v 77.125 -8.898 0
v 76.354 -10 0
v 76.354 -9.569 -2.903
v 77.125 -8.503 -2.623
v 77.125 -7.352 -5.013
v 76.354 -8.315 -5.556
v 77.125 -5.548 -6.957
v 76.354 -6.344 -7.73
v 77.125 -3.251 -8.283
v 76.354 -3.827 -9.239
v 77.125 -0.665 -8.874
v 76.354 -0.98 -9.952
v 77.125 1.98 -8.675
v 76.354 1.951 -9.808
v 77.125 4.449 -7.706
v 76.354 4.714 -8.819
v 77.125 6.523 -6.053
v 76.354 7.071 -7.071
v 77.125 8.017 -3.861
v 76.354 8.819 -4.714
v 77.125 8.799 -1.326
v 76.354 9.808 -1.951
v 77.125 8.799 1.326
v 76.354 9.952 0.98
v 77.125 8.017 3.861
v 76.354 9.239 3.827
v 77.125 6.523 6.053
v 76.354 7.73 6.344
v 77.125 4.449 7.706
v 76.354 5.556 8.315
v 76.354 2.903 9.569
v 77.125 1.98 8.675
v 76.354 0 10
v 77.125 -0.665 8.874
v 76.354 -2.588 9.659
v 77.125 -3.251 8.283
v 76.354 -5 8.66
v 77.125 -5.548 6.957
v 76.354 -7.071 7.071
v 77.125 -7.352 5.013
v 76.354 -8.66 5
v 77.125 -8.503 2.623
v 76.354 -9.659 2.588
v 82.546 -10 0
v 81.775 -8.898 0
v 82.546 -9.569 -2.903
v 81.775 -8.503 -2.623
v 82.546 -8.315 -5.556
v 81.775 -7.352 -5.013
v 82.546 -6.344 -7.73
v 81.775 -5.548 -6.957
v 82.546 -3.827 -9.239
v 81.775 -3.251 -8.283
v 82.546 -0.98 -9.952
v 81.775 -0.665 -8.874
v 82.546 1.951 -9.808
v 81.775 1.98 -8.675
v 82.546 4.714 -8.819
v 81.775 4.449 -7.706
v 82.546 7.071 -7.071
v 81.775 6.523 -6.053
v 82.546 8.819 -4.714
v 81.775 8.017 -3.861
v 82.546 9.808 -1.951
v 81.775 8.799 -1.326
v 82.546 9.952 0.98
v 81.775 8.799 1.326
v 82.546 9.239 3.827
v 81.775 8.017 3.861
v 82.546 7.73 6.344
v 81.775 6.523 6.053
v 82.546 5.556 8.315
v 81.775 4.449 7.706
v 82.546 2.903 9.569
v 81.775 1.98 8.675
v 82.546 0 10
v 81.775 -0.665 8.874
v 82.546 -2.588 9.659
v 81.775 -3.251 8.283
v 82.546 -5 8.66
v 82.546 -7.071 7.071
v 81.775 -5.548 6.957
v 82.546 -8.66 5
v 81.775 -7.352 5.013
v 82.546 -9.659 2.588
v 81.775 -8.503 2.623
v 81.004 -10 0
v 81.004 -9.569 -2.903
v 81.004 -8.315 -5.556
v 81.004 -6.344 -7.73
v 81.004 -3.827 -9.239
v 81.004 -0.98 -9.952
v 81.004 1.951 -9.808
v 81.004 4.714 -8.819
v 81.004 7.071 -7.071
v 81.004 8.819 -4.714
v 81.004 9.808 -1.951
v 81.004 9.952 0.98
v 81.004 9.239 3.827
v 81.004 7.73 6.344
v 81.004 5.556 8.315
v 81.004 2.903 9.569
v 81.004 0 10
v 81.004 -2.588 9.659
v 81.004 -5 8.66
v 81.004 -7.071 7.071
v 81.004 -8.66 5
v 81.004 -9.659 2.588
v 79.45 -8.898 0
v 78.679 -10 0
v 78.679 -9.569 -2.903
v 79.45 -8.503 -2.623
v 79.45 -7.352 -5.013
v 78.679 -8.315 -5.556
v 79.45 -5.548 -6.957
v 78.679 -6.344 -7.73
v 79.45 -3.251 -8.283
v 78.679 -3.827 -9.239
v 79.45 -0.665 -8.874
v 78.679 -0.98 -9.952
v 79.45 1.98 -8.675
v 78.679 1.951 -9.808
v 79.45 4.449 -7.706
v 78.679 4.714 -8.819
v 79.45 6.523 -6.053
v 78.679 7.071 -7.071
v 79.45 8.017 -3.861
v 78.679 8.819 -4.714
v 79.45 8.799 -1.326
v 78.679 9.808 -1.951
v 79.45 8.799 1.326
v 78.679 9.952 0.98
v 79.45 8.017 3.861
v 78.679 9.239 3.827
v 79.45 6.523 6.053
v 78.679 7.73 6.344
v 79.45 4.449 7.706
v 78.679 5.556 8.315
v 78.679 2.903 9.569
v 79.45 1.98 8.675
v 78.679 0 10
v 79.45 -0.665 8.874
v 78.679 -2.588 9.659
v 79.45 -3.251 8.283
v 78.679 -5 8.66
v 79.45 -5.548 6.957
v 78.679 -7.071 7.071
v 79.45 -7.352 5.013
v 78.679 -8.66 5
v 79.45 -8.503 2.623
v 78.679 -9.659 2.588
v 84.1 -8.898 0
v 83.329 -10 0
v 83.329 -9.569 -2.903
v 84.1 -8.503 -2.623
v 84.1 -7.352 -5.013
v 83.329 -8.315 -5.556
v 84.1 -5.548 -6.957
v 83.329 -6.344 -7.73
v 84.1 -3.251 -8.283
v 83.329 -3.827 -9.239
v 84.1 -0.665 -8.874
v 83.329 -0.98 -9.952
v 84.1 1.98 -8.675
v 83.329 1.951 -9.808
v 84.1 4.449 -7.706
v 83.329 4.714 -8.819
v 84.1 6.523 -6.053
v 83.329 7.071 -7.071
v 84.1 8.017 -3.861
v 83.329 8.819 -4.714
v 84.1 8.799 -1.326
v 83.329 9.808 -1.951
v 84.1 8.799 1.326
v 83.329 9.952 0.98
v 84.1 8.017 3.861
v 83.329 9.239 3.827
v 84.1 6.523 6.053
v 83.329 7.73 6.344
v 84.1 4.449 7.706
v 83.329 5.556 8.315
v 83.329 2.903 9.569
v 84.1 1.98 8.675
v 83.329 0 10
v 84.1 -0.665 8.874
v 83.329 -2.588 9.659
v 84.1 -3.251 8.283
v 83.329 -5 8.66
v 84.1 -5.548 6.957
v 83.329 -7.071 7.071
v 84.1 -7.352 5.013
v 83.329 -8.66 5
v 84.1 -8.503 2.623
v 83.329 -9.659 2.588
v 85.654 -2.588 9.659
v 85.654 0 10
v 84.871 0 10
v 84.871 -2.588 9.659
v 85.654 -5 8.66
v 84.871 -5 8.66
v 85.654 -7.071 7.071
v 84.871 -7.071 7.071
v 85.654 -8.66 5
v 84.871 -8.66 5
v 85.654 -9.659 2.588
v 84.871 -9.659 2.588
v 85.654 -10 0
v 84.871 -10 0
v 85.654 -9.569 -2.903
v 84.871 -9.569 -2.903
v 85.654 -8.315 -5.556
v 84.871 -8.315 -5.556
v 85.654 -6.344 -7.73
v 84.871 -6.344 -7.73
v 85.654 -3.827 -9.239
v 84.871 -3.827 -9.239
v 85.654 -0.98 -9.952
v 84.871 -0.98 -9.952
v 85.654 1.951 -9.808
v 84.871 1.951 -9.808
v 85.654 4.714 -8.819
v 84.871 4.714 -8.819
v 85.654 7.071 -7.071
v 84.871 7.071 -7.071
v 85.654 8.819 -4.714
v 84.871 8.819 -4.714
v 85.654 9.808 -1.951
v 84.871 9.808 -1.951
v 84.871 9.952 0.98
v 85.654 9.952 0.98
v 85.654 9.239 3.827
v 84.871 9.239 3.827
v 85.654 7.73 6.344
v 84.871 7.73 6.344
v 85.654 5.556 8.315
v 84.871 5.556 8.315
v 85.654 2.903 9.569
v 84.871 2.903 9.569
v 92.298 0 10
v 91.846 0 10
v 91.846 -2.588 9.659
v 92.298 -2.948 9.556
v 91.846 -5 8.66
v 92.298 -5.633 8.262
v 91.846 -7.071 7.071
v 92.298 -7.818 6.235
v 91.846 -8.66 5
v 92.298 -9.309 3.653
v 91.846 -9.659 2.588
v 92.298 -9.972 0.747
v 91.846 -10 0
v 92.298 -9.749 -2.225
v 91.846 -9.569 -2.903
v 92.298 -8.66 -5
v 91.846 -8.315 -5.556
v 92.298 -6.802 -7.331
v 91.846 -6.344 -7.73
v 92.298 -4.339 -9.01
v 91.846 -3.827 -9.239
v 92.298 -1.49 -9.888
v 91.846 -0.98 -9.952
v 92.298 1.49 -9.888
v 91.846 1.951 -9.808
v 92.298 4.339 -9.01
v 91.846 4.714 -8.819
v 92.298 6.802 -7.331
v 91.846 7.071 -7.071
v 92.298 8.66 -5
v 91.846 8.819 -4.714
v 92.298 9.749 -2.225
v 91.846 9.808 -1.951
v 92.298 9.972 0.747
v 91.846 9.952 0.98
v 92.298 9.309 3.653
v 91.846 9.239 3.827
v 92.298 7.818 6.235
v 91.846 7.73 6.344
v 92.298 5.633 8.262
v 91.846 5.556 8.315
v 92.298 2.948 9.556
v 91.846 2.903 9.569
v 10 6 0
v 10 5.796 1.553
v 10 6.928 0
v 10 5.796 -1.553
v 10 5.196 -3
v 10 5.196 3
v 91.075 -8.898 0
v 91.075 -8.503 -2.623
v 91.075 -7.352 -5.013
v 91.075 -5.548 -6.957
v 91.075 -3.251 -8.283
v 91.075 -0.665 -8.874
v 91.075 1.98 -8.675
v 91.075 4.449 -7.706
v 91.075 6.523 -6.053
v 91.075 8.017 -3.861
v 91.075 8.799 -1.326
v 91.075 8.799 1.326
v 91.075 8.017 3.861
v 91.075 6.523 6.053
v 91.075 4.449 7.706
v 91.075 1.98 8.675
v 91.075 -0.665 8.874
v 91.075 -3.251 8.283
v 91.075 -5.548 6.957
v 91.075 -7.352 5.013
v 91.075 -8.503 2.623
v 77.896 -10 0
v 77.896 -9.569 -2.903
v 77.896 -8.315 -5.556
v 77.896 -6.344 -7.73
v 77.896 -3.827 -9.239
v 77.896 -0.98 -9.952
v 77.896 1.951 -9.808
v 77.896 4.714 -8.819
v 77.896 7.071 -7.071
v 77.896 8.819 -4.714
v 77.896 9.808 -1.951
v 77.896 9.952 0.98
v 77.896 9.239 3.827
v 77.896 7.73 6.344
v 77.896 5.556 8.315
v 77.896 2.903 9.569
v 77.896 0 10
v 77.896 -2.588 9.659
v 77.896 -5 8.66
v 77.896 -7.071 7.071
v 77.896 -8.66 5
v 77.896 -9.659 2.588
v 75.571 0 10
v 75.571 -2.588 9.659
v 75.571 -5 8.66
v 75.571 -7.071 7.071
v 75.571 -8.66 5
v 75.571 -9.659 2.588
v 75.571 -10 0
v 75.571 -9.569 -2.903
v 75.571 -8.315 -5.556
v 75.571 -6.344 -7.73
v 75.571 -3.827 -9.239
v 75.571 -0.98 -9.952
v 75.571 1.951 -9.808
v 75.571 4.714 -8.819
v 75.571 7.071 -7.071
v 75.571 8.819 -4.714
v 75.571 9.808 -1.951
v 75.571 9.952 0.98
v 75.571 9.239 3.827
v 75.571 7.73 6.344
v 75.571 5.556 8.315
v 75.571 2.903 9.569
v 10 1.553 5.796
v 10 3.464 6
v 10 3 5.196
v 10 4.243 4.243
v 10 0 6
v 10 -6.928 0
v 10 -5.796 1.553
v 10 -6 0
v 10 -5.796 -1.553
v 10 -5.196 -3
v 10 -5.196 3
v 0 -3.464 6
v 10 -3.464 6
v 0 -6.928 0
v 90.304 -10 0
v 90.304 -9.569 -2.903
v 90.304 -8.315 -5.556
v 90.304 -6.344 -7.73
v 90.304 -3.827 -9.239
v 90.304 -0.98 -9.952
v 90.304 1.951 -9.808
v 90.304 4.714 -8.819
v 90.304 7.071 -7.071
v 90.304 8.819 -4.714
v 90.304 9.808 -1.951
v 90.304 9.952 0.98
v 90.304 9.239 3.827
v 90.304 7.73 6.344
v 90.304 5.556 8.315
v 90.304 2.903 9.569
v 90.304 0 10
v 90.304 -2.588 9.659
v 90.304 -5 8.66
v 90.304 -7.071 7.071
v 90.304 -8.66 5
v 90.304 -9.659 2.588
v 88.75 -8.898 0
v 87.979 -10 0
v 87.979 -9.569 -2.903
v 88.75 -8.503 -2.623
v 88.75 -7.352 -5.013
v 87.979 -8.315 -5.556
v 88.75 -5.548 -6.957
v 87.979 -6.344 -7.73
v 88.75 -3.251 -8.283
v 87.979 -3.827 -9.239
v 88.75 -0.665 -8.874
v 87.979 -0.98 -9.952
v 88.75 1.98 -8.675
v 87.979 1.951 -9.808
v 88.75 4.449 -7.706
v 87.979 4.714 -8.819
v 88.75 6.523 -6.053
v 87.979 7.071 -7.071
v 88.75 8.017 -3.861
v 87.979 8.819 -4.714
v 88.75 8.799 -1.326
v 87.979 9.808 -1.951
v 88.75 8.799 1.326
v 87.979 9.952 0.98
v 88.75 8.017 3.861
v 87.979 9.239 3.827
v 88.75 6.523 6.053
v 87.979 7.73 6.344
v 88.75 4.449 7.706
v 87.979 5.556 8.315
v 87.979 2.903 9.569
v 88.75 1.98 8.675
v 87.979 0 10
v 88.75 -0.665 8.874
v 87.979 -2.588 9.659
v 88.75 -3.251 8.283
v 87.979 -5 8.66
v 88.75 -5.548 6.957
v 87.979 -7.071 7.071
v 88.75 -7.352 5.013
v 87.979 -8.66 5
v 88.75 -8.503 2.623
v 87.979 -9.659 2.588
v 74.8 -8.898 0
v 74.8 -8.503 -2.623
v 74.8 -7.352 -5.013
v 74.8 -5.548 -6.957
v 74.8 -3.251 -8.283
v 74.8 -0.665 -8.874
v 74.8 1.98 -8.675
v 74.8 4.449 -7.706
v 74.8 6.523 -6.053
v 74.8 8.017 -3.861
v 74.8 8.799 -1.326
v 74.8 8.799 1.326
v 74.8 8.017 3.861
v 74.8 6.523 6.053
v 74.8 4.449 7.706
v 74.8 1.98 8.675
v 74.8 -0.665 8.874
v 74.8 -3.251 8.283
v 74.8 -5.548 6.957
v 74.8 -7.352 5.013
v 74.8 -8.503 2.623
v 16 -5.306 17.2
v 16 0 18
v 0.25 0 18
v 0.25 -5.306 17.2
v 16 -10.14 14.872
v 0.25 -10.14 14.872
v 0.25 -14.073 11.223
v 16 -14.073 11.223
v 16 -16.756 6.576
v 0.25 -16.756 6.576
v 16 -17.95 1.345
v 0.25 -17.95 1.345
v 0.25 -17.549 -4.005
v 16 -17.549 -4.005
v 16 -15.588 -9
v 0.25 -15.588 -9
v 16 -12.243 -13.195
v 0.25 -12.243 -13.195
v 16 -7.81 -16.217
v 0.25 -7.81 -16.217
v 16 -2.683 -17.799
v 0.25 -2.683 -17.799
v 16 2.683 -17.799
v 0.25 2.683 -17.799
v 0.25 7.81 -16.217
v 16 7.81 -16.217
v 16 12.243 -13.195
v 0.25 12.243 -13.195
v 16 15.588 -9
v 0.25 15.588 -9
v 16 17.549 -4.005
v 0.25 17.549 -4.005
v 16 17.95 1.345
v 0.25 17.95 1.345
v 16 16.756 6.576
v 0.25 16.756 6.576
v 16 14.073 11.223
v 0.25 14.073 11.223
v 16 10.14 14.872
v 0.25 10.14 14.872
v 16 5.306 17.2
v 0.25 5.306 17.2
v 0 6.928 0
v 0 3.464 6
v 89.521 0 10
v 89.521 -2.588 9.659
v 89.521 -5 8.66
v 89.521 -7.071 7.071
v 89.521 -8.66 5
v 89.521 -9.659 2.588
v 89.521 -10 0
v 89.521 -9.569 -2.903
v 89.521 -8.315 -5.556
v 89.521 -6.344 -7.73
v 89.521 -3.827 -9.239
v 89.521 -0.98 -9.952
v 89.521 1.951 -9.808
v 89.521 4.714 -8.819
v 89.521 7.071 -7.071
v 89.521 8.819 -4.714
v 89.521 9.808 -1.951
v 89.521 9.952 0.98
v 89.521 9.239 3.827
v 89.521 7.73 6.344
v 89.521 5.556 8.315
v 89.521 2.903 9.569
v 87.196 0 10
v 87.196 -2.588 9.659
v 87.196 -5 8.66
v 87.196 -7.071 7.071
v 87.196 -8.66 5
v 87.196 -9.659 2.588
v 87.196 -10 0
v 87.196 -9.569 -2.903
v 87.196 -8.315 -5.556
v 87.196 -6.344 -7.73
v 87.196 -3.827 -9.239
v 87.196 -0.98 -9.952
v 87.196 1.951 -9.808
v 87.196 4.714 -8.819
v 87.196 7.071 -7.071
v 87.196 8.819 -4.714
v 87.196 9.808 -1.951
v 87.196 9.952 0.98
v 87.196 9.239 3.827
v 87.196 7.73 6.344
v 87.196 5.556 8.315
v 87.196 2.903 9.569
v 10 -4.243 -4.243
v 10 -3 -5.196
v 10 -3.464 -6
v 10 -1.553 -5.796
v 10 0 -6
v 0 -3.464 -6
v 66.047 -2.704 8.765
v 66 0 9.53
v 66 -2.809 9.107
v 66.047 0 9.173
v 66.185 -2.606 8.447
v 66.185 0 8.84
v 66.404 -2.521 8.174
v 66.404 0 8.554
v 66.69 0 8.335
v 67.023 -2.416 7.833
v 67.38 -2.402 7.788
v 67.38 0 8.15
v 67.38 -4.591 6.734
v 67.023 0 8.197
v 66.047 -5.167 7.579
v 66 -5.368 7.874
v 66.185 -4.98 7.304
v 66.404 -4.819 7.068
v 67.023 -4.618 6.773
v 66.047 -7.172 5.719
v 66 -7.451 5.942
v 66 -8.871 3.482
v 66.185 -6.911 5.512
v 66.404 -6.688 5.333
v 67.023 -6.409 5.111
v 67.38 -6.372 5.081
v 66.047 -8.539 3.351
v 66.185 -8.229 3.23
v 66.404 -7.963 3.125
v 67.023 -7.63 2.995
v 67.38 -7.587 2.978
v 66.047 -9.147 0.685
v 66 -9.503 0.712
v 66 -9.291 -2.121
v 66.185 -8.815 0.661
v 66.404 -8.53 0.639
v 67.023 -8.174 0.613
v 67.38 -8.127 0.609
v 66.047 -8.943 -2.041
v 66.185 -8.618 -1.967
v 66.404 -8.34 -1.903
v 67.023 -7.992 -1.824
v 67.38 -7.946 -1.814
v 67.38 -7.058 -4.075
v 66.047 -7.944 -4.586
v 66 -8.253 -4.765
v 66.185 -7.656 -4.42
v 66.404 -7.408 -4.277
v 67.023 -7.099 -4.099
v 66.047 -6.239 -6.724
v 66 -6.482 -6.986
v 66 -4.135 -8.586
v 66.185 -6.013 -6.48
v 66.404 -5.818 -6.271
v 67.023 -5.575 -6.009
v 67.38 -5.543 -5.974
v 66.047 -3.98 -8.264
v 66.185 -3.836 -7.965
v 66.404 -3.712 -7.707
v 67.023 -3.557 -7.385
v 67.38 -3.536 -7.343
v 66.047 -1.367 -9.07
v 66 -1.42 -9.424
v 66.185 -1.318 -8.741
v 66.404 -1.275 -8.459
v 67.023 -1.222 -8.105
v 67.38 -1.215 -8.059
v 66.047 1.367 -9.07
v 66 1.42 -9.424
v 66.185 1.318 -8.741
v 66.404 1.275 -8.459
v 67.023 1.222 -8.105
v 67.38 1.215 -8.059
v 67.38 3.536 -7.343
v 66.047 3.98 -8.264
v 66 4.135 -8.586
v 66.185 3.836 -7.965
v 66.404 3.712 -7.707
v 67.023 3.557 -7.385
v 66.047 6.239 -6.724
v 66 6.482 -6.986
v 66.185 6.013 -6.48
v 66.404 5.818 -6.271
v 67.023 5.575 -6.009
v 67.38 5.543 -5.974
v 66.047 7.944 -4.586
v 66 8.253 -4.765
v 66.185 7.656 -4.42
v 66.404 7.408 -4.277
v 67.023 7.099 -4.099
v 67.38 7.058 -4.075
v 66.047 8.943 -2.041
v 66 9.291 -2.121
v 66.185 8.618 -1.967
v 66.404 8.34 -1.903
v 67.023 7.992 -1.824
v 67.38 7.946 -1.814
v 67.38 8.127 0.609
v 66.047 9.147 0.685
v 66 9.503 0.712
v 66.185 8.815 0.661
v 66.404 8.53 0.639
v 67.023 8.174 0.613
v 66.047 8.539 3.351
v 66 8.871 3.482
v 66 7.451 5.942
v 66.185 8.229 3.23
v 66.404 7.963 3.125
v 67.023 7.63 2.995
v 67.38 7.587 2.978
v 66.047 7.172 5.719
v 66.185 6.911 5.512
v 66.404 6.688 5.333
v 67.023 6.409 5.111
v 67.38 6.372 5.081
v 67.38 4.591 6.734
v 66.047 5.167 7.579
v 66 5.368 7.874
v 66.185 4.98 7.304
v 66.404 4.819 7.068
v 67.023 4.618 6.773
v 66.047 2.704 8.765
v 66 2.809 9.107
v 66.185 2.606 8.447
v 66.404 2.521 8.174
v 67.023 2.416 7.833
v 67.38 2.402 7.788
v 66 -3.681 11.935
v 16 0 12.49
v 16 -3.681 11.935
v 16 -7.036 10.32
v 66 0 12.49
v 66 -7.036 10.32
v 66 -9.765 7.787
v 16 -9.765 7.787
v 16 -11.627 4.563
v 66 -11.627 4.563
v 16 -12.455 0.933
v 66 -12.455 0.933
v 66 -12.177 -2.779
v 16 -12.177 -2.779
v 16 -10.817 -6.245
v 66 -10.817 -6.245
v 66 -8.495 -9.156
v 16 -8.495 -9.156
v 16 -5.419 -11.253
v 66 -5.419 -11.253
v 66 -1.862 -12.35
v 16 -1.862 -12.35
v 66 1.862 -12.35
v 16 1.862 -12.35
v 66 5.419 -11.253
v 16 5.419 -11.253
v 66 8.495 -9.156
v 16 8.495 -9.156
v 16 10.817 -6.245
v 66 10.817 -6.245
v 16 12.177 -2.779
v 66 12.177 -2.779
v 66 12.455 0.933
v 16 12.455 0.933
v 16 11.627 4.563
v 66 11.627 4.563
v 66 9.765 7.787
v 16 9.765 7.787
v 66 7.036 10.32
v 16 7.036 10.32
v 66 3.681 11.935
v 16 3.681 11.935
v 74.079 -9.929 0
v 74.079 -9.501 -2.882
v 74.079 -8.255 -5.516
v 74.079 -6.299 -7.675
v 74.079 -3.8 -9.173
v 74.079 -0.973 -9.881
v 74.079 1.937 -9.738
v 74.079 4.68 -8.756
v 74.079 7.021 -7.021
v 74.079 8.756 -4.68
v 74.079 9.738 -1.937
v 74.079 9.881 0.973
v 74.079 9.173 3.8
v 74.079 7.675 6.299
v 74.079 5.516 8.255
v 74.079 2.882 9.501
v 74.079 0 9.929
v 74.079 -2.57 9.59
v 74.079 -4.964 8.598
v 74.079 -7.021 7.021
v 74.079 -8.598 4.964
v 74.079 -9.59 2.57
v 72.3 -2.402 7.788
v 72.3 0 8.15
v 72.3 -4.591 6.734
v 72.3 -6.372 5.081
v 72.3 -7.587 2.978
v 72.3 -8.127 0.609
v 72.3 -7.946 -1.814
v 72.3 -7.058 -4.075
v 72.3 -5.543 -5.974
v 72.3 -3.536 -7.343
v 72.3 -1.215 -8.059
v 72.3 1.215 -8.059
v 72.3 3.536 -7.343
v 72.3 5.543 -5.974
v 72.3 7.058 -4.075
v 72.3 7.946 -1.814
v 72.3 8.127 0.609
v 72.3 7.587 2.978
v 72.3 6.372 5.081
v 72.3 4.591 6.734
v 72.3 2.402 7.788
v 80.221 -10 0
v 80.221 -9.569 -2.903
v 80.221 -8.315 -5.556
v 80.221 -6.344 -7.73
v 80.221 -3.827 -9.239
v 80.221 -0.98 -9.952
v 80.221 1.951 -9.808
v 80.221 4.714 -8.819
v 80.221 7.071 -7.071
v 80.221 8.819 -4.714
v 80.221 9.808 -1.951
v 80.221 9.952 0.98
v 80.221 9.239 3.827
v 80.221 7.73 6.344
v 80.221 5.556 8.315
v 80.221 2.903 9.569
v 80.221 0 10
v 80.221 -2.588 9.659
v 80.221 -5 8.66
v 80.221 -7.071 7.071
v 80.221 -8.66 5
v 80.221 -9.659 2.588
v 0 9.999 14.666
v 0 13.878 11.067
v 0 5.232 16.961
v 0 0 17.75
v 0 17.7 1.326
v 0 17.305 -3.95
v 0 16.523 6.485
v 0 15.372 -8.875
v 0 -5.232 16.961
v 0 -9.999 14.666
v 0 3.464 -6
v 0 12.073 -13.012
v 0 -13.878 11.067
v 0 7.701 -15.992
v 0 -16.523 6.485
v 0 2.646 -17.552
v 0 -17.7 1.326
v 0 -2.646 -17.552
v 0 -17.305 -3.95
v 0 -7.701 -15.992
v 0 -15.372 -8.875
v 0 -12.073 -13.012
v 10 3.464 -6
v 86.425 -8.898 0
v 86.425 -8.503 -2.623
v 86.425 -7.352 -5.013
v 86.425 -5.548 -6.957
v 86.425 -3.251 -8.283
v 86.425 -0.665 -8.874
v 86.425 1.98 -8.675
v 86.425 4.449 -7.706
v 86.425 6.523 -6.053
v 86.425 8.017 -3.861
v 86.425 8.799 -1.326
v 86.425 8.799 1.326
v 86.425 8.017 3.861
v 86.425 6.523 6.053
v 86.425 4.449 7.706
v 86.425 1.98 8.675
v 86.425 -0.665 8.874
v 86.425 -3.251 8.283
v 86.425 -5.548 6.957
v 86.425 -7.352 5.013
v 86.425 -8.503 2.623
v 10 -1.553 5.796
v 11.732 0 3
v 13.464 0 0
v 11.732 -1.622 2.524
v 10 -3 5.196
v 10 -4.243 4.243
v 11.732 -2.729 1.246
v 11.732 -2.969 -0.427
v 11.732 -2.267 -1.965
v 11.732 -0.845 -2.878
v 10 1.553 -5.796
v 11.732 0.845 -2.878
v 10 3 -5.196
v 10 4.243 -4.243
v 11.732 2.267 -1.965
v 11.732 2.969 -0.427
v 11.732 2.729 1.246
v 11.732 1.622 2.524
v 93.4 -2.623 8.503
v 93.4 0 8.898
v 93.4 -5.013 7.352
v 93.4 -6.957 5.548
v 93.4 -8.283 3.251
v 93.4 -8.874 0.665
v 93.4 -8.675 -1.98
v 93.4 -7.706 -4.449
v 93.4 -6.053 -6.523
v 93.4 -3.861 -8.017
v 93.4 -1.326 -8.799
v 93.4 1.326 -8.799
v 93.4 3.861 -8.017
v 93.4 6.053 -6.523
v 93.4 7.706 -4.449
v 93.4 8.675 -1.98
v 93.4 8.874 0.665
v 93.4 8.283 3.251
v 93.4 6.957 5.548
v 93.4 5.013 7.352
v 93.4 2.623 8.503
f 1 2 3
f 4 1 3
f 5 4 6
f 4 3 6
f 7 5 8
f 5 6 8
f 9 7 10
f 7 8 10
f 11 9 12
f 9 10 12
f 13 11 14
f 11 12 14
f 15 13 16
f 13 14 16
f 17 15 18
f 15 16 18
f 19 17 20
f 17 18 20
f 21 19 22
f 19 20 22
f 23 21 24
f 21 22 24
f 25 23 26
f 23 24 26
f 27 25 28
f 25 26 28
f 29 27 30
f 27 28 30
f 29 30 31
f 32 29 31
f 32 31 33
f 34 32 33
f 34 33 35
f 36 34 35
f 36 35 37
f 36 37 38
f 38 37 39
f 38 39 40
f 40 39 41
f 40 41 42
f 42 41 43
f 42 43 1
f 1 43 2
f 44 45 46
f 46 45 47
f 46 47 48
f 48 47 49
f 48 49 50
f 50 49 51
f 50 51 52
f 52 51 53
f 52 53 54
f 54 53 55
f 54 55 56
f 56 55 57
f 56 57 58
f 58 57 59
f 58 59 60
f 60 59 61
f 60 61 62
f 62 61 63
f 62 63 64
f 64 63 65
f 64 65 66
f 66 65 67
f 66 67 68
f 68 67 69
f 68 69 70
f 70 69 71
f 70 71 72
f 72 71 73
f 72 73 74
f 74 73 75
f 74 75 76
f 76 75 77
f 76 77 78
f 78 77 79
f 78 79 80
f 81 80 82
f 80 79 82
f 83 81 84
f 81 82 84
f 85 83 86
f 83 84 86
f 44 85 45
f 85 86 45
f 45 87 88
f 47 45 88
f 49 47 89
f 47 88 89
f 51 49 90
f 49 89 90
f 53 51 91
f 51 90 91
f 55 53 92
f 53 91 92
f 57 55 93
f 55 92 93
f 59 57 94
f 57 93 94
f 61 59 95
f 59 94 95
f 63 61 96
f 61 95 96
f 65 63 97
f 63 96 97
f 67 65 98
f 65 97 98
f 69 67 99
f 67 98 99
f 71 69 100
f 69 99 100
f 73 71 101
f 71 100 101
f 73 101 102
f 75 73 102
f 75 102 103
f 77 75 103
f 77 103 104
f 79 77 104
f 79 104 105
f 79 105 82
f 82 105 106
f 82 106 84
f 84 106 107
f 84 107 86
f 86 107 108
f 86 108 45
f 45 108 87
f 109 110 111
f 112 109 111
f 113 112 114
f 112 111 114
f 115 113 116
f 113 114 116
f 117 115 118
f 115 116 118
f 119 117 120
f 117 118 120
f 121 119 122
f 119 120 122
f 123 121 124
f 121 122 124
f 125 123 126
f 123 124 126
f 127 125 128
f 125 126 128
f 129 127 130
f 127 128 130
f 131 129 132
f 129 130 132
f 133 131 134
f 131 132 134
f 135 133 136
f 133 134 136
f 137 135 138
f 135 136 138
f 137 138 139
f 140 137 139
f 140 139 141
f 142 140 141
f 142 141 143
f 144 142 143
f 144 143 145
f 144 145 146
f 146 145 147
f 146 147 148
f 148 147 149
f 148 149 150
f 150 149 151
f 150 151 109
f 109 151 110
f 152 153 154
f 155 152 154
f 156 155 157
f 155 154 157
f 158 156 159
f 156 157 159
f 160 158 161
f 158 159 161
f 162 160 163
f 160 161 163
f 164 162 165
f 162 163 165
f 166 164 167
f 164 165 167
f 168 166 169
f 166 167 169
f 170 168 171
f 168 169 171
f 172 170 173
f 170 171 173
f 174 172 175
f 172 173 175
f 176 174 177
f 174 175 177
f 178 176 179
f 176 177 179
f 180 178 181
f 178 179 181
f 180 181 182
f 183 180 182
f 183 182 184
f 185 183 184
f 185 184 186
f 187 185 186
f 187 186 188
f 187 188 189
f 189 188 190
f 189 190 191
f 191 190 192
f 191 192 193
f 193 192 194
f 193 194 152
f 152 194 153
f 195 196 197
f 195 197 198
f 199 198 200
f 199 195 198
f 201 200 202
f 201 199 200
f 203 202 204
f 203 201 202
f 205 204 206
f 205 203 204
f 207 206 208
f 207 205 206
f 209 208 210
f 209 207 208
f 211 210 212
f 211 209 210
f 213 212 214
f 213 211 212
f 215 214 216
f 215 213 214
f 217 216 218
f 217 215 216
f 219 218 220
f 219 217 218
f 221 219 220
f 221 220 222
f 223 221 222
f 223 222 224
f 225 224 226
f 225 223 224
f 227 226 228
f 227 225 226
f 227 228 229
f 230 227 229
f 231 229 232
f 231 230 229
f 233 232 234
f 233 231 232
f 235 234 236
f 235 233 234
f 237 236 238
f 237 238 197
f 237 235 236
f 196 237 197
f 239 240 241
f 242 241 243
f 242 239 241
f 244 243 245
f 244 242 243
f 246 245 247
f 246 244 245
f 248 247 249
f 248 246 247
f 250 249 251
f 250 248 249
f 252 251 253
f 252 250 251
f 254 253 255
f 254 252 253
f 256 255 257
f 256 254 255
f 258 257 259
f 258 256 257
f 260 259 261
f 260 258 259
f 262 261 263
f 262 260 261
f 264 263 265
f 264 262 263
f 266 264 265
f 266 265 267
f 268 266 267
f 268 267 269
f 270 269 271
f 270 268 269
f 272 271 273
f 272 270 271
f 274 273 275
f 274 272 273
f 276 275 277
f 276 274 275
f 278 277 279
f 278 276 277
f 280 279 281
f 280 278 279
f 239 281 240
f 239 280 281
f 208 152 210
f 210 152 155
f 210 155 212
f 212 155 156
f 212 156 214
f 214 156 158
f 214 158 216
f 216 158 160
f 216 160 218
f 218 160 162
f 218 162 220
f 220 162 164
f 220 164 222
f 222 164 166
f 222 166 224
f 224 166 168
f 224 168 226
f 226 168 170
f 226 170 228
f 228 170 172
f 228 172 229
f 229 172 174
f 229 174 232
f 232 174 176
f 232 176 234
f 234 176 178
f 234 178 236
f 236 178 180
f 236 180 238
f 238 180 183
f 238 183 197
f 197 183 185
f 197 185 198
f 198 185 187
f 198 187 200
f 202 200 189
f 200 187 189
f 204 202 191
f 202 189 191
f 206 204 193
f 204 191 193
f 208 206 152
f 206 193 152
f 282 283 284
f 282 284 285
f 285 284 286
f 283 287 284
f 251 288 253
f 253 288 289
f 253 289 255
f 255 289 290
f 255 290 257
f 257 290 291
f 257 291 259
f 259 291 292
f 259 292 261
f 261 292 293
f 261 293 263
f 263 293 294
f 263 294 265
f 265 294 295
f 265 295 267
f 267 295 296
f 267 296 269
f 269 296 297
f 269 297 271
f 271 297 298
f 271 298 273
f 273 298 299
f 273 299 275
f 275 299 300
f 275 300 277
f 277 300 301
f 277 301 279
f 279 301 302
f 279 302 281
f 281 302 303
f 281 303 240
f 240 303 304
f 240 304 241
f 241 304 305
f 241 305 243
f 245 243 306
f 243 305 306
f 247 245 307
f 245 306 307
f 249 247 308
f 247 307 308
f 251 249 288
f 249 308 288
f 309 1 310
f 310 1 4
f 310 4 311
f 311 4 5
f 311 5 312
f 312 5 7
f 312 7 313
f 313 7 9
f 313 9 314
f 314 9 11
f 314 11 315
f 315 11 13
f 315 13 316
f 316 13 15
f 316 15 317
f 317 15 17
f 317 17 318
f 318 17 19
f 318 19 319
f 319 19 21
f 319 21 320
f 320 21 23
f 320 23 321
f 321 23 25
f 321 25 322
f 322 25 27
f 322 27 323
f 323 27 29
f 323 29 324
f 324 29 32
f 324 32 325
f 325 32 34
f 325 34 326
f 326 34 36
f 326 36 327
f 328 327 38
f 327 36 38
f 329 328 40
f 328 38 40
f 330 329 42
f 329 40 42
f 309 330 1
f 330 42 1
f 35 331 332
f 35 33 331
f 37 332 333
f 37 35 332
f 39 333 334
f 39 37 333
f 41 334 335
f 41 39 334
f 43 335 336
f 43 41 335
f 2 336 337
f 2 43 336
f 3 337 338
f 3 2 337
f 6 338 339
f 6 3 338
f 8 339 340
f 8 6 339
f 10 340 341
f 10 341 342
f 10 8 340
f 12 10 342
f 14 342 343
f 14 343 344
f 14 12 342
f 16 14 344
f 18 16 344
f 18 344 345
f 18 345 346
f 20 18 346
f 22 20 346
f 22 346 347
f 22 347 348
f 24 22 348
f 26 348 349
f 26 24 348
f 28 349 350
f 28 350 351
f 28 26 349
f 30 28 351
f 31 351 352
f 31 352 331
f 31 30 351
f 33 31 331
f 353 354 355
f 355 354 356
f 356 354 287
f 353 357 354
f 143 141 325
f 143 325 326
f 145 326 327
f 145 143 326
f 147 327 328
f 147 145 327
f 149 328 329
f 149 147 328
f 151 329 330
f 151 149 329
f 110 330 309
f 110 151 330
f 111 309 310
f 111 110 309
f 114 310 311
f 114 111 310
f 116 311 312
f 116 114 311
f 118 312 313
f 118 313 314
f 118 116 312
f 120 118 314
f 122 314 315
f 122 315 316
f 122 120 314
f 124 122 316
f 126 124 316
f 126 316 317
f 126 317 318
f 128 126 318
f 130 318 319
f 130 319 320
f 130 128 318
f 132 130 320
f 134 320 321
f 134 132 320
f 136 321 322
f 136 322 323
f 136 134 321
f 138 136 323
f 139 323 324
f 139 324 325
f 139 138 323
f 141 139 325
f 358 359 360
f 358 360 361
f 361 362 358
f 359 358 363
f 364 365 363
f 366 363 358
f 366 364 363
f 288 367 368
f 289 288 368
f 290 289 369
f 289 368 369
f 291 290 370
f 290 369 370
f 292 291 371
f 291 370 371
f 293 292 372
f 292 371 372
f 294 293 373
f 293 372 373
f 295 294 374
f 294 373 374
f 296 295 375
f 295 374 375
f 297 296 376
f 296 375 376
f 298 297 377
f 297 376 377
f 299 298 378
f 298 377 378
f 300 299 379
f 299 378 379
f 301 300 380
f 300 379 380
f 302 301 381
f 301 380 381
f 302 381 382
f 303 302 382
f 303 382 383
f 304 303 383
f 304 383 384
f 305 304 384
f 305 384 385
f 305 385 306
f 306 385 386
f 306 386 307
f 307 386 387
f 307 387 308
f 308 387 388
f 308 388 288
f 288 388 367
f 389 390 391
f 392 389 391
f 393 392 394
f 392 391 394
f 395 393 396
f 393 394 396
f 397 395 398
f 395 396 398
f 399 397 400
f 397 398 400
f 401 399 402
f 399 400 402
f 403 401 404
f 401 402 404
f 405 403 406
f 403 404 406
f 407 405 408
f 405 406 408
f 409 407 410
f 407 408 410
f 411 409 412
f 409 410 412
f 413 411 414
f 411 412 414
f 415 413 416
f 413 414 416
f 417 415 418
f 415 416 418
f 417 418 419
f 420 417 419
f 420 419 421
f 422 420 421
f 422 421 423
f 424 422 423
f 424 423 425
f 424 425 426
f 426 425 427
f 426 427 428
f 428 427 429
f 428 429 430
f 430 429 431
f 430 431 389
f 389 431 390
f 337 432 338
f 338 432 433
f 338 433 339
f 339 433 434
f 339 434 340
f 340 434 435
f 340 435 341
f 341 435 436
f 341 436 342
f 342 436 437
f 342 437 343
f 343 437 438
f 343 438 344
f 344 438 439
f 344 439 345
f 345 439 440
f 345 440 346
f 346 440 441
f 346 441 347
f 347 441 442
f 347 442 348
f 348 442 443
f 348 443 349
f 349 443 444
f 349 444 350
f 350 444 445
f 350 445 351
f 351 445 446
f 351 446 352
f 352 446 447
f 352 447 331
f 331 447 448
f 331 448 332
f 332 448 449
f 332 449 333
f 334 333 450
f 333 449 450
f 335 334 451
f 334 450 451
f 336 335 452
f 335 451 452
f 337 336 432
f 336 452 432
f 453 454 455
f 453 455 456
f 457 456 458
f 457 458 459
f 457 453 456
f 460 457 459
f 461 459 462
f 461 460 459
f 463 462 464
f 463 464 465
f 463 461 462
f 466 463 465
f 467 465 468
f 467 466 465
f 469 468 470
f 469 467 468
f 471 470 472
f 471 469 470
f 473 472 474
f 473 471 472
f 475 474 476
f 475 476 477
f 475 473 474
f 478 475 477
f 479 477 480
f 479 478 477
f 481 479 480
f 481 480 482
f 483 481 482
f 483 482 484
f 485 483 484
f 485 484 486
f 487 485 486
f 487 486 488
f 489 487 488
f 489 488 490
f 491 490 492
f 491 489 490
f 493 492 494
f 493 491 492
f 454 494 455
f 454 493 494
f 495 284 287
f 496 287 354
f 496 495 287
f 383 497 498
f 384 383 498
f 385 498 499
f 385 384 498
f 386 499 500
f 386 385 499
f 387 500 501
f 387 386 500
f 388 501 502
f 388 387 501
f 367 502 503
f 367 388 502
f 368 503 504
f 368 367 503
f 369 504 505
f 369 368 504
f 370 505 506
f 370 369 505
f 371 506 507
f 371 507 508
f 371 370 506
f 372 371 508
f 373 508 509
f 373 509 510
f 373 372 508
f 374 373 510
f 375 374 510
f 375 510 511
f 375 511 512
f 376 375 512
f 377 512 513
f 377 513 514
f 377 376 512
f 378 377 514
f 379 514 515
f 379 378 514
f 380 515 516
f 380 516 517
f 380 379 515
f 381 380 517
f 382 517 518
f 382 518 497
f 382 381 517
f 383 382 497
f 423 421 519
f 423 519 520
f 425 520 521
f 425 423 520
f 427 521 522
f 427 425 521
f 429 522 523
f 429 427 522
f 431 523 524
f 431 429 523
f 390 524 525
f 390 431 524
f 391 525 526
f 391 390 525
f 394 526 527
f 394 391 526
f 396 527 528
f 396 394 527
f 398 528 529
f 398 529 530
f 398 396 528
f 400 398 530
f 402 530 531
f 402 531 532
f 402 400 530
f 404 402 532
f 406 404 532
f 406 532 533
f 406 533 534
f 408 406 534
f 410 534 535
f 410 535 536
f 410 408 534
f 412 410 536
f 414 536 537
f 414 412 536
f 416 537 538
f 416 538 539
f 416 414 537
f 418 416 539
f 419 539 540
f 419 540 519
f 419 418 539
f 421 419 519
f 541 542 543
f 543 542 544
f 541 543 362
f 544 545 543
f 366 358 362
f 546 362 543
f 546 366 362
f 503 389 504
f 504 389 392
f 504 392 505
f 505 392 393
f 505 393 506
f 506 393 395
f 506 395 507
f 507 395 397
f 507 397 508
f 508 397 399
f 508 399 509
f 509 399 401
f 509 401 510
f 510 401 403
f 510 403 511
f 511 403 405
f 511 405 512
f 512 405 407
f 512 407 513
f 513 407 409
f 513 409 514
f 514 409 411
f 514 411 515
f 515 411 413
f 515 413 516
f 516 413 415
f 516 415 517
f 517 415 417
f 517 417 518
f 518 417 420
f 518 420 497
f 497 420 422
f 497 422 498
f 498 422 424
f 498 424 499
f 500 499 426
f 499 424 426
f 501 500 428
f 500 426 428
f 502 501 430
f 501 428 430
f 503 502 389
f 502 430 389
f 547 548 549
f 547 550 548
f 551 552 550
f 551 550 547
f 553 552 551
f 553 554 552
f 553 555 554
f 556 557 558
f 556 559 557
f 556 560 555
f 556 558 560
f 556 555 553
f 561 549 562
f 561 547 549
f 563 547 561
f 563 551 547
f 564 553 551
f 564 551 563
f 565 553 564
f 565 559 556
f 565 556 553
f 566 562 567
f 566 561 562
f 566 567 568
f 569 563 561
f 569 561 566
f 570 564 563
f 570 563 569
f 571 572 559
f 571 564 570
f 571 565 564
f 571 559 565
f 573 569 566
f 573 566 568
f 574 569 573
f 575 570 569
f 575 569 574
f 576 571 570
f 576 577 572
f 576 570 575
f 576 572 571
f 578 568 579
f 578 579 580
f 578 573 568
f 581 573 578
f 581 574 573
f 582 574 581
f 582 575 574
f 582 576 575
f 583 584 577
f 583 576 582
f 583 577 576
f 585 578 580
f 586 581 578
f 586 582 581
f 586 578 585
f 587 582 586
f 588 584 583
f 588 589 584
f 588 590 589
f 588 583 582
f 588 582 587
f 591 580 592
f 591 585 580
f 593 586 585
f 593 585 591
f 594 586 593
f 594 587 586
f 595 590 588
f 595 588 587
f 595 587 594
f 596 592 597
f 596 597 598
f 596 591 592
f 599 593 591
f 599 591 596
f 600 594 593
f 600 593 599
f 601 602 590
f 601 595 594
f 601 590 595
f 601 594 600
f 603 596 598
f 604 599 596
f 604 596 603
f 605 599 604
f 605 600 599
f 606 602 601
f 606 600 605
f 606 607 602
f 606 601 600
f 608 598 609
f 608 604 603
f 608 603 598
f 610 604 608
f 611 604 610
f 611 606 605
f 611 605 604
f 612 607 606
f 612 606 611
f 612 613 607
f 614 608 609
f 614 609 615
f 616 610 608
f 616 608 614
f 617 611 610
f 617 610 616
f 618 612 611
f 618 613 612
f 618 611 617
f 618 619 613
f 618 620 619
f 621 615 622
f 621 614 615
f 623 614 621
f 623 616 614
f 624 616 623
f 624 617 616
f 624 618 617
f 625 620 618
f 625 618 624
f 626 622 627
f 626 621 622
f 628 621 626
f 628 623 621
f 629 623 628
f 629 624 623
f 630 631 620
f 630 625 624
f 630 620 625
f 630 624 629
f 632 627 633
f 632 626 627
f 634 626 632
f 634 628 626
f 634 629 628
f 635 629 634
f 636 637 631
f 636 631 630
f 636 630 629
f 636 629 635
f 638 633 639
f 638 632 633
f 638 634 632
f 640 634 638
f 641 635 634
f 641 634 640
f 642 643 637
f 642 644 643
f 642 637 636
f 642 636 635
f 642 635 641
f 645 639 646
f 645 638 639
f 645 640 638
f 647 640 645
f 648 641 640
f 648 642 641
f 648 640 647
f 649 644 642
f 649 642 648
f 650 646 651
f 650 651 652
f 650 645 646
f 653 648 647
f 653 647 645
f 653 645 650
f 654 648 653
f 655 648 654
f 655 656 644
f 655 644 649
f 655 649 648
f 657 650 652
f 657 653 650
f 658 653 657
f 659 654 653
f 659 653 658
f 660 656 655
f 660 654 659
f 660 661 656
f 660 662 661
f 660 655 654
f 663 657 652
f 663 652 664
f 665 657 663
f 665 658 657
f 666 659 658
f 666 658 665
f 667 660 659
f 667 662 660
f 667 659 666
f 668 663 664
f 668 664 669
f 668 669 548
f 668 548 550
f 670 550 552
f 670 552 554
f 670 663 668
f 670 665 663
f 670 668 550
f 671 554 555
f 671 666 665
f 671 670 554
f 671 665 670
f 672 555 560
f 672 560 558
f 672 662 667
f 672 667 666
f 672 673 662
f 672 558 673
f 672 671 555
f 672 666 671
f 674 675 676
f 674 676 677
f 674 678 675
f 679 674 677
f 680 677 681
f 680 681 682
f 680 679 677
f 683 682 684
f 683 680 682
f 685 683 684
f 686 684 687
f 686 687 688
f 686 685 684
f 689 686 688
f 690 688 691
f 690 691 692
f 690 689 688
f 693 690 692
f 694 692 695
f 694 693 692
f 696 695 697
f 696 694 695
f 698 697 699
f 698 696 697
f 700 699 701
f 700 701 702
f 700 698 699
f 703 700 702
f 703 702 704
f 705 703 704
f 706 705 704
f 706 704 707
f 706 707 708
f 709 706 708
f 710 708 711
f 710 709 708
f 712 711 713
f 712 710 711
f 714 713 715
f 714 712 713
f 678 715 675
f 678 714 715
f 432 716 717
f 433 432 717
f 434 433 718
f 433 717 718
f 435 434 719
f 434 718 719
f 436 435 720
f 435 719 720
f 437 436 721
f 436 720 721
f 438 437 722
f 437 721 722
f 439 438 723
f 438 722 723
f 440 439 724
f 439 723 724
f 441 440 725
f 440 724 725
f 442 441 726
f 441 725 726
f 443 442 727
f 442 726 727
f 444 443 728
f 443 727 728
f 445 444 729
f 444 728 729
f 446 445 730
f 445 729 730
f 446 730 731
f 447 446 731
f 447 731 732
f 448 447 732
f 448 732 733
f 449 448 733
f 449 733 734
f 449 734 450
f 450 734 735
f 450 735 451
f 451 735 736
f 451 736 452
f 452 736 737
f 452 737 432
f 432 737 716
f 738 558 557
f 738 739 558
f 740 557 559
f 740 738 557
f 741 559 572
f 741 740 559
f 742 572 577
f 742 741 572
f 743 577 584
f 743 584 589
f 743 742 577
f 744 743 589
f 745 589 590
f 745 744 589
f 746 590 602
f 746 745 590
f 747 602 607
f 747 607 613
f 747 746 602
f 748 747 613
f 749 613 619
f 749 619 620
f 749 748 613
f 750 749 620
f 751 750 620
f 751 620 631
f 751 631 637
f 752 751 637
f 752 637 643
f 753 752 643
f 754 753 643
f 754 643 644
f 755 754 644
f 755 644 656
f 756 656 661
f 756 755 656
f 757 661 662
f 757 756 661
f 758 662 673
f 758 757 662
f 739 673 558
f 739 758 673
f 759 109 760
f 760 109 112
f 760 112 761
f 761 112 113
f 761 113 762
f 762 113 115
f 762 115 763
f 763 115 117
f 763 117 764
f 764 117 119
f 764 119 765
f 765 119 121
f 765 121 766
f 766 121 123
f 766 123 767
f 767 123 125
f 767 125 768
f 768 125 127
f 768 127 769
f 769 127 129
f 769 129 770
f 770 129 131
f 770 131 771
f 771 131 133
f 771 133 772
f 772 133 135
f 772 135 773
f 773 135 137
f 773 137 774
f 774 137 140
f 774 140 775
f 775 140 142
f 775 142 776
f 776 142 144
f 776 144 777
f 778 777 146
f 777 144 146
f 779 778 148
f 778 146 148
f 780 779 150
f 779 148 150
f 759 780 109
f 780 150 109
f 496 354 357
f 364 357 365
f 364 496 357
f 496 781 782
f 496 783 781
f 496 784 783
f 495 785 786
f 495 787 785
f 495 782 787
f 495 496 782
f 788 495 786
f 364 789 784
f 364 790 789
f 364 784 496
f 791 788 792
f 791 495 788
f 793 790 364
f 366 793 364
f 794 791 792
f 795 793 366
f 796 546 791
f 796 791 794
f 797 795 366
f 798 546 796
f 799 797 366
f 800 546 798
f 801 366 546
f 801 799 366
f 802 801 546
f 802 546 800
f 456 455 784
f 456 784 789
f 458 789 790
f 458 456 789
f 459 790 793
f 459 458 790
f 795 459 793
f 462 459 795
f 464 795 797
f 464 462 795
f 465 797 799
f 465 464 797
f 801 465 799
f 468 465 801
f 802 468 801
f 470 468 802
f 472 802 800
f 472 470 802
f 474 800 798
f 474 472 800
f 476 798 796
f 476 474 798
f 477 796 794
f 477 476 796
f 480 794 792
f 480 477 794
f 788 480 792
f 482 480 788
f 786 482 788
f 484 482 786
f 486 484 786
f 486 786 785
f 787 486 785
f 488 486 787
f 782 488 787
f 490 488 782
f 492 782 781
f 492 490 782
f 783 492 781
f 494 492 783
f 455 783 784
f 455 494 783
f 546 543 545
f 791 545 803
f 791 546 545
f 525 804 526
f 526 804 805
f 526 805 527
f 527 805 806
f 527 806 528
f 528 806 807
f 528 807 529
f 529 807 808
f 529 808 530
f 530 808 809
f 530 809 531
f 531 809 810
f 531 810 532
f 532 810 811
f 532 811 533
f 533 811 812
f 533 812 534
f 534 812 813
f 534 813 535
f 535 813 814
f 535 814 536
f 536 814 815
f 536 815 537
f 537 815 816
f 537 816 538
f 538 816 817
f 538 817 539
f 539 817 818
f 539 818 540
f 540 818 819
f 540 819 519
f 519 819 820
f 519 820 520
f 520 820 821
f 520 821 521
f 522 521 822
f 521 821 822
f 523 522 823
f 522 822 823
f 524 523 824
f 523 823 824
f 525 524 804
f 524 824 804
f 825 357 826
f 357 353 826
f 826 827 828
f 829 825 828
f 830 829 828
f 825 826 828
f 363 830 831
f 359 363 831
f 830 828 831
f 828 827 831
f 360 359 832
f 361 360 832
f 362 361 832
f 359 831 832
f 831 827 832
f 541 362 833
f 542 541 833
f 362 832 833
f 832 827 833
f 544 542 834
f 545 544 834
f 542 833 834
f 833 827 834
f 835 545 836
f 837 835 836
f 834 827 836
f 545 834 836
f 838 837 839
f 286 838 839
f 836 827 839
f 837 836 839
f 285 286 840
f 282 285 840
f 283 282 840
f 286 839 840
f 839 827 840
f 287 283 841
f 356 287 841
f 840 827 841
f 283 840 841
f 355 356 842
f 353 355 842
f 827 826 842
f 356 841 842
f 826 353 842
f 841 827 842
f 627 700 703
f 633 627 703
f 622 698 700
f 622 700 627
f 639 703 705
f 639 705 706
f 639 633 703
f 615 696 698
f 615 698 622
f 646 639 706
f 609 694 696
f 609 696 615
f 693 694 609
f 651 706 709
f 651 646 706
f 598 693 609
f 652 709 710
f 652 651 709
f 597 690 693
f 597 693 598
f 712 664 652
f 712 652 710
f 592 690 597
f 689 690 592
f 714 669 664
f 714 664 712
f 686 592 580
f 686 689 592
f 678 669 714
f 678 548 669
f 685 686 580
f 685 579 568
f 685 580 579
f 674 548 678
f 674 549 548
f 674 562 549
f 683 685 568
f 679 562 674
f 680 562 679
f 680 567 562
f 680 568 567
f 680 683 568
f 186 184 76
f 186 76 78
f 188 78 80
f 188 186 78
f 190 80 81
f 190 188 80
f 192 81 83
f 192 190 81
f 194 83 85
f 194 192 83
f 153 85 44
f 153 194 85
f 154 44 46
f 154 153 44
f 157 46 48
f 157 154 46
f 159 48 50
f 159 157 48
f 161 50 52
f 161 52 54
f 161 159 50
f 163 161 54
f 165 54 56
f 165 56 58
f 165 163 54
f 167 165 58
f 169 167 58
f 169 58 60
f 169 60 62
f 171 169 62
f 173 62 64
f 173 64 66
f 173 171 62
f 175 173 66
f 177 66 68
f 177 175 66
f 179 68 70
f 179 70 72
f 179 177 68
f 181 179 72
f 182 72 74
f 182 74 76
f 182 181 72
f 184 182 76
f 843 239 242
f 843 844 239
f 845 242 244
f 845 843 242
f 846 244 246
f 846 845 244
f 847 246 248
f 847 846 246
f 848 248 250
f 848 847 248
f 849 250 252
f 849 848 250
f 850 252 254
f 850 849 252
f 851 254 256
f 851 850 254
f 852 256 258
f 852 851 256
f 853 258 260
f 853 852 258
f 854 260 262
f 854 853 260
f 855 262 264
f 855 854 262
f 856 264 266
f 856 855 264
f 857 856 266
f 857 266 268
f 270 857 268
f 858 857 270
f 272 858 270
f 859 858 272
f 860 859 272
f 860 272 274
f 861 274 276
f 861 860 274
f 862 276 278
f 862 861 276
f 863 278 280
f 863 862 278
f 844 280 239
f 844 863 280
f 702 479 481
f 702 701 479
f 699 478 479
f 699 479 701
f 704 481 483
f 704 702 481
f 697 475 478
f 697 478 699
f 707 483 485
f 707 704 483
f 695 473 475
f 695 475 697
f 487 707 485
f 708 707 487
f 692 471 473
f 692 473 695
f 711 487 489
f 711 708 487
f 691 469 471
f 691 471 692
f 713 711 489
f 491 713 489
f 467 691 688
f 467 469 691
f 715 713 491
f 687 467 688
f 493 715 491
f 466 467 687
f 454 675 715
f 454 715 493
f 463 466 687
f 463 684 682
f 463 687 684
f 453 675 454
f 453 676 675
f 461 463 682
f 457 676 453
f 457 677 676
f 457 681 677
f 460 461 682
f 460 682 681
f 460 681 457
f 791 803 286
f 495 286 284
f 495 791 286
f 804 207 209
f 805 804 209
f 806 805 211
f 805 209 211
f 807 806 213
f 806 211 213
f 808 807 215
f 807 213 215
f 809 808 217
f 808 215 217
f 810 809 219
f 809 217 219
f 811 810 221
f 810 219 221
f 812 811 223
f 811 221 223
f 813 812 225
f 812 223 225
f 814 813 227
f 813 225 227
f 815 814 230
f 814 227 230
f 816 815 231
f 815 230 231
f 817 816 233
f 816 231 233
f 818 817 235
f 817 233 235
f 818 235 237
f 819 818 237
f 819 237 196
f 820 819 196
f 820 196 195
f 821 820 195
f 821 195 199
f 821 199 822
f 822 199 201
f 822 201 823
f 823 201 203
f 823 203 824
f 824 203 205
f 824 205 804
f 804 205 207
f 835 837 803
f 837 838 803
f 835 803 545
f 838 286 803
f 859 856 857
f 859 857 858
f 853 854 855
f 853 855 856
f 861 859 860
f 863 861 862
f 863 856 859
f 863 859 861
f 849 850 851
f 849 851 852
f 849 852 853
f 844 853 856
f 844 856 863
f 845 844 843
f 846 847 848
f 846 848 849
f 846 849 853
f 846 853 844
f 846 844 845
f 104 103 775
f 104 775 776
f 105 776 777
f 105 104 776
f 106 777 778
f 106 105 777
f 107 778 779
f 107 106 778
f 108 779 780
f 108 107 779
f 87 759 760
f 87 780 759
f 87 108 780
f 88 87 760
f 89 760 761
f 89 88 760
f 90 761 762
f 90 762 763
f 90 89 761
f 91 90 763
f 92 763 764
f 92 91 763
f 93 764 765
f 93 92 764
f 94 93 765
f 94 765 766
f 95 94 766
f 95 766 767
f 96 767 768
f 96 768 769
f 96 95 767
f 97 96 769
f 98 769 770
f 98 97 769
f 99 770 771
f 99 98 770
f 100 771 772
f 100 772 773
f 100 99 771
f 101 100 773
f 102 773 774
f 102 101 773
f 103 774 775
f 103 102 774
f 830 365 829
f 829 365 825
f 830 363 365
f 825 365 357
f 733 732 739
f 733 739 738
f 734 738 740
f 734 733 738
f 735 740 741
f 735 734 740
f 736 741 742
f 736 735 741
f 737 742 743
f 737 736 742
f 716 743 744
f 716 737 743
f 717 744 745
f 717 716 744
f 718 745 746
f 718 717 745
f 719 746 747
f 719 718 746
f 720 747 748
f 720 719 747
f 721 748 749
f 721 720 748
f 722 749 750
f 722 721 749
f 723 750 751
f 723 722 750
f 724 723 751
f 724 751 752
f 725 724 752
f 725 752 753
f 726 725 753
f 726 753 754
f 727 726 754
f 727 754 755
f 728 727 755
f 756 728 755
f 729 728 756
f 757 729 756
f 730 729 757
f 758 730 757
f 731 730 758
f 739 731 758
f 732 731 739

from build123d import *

# Parameters (mm, degrees)
CHAMFER1_SIZE   = 0.25
HEX_2_DEPTH     = 10
THDSCHPAT_COUNT = 8
THDSCHPAT_PITCH = 2.325


with BuildPart() as part:
    # BodySke → BaseBody (revolve)
    with BuildSketch(Plane.XY, mode=Mode.PRIVATE) as basebody_sk:
        with BuildLine():
            Line((0, 0), (0, 18))
            Line((0, 18), (16, 18))
            Line((16, 18), (16, 12.49))
            Line((16, 12.49), (66, 12.49))
            Line((66, 12.49), (66, 9.53))
            ThreePointArc((66, 9.53), (66.404192642, 8.554192642), (67.38, 8.15))
            Line((67.38, 8.15), (72.3, 8.15))
            Line((72.3, 8.15), (74.15, 10))
            Line((74.15, 10), (92.2985, 10))
            Line((92.2985, 10), (93.4, 8.8985))
            Line((93.4, 8.8985), (93.4, 0))
            Line((93.4, 0), (0, 0))
        make_face()
    revolve(basebody_sk.sketch.rotate(Axis((-6.35, 0, 0), (1, 0, 0)), 90), axis=Axis((-6.35, 0, 0), (1, 0, 0)))

    # Chamfer1
    chamfer1_edges = [part.edges().sort_by_distance(p)[0] for p in [
        (0, 0, -18),
    ]]
    chamfer(chamfer1_edges, length=CHAMFER1_SIZE)

    # Sketch2 → PreBroach (revolve, cut)
    with BuildSketch(Plane.XY, mode=Mode.PRIVATE) as prebroach_sk:
        Polygon((0, 6), (10, 6), (13.464101615, 0), (0, 0), align=None)
    revolve(prebroach_sk.sketch.rotate(Axis((0, 0, 0), (1, 0, 0)), 90), axis=Axis((0, 0, 0), (1, 0, 0)), mode=Mode.SUBTRACT)

    # Sketch3 → Hex 2 (cut)
    with BuildSketch(Plane.ZY):
        Polygon((-6, -3.464101615), (-6, 3.464101615), (0, 6.92820323), (6, 3.464101615), (6, -3.464101615), (0, -6.92820323), align=None)
    extrude(amount=-HEX_2_DEPTH, mode=Mode.SUBTRACT)

    # ThdSchSke → ThreadSchematic (revolve, cut)
    with BuildSketch(Plane.XY):
        Polygon((74.8, -8.8985), (72.285204627, -12.49), (72.285204627, -15.6125), (77.314795373, -15.6125), (77.314795373, -12.49), align=None)
    threadschematic = revolve(axis=Axis((-3.175, 0, 0), (1, 0, 0)), mode=Mode.SUBTRACT)

    # ThdSchPat: ThreadSchematic ×8
    with Locations(*[(i * THDSCHPAT_PITCH, 0, 0) for i in range(1, THDSCHPAT_COUNT)]):
        add(threadschematic, mode=Mode.SUBTRACT)


solid = part.part
